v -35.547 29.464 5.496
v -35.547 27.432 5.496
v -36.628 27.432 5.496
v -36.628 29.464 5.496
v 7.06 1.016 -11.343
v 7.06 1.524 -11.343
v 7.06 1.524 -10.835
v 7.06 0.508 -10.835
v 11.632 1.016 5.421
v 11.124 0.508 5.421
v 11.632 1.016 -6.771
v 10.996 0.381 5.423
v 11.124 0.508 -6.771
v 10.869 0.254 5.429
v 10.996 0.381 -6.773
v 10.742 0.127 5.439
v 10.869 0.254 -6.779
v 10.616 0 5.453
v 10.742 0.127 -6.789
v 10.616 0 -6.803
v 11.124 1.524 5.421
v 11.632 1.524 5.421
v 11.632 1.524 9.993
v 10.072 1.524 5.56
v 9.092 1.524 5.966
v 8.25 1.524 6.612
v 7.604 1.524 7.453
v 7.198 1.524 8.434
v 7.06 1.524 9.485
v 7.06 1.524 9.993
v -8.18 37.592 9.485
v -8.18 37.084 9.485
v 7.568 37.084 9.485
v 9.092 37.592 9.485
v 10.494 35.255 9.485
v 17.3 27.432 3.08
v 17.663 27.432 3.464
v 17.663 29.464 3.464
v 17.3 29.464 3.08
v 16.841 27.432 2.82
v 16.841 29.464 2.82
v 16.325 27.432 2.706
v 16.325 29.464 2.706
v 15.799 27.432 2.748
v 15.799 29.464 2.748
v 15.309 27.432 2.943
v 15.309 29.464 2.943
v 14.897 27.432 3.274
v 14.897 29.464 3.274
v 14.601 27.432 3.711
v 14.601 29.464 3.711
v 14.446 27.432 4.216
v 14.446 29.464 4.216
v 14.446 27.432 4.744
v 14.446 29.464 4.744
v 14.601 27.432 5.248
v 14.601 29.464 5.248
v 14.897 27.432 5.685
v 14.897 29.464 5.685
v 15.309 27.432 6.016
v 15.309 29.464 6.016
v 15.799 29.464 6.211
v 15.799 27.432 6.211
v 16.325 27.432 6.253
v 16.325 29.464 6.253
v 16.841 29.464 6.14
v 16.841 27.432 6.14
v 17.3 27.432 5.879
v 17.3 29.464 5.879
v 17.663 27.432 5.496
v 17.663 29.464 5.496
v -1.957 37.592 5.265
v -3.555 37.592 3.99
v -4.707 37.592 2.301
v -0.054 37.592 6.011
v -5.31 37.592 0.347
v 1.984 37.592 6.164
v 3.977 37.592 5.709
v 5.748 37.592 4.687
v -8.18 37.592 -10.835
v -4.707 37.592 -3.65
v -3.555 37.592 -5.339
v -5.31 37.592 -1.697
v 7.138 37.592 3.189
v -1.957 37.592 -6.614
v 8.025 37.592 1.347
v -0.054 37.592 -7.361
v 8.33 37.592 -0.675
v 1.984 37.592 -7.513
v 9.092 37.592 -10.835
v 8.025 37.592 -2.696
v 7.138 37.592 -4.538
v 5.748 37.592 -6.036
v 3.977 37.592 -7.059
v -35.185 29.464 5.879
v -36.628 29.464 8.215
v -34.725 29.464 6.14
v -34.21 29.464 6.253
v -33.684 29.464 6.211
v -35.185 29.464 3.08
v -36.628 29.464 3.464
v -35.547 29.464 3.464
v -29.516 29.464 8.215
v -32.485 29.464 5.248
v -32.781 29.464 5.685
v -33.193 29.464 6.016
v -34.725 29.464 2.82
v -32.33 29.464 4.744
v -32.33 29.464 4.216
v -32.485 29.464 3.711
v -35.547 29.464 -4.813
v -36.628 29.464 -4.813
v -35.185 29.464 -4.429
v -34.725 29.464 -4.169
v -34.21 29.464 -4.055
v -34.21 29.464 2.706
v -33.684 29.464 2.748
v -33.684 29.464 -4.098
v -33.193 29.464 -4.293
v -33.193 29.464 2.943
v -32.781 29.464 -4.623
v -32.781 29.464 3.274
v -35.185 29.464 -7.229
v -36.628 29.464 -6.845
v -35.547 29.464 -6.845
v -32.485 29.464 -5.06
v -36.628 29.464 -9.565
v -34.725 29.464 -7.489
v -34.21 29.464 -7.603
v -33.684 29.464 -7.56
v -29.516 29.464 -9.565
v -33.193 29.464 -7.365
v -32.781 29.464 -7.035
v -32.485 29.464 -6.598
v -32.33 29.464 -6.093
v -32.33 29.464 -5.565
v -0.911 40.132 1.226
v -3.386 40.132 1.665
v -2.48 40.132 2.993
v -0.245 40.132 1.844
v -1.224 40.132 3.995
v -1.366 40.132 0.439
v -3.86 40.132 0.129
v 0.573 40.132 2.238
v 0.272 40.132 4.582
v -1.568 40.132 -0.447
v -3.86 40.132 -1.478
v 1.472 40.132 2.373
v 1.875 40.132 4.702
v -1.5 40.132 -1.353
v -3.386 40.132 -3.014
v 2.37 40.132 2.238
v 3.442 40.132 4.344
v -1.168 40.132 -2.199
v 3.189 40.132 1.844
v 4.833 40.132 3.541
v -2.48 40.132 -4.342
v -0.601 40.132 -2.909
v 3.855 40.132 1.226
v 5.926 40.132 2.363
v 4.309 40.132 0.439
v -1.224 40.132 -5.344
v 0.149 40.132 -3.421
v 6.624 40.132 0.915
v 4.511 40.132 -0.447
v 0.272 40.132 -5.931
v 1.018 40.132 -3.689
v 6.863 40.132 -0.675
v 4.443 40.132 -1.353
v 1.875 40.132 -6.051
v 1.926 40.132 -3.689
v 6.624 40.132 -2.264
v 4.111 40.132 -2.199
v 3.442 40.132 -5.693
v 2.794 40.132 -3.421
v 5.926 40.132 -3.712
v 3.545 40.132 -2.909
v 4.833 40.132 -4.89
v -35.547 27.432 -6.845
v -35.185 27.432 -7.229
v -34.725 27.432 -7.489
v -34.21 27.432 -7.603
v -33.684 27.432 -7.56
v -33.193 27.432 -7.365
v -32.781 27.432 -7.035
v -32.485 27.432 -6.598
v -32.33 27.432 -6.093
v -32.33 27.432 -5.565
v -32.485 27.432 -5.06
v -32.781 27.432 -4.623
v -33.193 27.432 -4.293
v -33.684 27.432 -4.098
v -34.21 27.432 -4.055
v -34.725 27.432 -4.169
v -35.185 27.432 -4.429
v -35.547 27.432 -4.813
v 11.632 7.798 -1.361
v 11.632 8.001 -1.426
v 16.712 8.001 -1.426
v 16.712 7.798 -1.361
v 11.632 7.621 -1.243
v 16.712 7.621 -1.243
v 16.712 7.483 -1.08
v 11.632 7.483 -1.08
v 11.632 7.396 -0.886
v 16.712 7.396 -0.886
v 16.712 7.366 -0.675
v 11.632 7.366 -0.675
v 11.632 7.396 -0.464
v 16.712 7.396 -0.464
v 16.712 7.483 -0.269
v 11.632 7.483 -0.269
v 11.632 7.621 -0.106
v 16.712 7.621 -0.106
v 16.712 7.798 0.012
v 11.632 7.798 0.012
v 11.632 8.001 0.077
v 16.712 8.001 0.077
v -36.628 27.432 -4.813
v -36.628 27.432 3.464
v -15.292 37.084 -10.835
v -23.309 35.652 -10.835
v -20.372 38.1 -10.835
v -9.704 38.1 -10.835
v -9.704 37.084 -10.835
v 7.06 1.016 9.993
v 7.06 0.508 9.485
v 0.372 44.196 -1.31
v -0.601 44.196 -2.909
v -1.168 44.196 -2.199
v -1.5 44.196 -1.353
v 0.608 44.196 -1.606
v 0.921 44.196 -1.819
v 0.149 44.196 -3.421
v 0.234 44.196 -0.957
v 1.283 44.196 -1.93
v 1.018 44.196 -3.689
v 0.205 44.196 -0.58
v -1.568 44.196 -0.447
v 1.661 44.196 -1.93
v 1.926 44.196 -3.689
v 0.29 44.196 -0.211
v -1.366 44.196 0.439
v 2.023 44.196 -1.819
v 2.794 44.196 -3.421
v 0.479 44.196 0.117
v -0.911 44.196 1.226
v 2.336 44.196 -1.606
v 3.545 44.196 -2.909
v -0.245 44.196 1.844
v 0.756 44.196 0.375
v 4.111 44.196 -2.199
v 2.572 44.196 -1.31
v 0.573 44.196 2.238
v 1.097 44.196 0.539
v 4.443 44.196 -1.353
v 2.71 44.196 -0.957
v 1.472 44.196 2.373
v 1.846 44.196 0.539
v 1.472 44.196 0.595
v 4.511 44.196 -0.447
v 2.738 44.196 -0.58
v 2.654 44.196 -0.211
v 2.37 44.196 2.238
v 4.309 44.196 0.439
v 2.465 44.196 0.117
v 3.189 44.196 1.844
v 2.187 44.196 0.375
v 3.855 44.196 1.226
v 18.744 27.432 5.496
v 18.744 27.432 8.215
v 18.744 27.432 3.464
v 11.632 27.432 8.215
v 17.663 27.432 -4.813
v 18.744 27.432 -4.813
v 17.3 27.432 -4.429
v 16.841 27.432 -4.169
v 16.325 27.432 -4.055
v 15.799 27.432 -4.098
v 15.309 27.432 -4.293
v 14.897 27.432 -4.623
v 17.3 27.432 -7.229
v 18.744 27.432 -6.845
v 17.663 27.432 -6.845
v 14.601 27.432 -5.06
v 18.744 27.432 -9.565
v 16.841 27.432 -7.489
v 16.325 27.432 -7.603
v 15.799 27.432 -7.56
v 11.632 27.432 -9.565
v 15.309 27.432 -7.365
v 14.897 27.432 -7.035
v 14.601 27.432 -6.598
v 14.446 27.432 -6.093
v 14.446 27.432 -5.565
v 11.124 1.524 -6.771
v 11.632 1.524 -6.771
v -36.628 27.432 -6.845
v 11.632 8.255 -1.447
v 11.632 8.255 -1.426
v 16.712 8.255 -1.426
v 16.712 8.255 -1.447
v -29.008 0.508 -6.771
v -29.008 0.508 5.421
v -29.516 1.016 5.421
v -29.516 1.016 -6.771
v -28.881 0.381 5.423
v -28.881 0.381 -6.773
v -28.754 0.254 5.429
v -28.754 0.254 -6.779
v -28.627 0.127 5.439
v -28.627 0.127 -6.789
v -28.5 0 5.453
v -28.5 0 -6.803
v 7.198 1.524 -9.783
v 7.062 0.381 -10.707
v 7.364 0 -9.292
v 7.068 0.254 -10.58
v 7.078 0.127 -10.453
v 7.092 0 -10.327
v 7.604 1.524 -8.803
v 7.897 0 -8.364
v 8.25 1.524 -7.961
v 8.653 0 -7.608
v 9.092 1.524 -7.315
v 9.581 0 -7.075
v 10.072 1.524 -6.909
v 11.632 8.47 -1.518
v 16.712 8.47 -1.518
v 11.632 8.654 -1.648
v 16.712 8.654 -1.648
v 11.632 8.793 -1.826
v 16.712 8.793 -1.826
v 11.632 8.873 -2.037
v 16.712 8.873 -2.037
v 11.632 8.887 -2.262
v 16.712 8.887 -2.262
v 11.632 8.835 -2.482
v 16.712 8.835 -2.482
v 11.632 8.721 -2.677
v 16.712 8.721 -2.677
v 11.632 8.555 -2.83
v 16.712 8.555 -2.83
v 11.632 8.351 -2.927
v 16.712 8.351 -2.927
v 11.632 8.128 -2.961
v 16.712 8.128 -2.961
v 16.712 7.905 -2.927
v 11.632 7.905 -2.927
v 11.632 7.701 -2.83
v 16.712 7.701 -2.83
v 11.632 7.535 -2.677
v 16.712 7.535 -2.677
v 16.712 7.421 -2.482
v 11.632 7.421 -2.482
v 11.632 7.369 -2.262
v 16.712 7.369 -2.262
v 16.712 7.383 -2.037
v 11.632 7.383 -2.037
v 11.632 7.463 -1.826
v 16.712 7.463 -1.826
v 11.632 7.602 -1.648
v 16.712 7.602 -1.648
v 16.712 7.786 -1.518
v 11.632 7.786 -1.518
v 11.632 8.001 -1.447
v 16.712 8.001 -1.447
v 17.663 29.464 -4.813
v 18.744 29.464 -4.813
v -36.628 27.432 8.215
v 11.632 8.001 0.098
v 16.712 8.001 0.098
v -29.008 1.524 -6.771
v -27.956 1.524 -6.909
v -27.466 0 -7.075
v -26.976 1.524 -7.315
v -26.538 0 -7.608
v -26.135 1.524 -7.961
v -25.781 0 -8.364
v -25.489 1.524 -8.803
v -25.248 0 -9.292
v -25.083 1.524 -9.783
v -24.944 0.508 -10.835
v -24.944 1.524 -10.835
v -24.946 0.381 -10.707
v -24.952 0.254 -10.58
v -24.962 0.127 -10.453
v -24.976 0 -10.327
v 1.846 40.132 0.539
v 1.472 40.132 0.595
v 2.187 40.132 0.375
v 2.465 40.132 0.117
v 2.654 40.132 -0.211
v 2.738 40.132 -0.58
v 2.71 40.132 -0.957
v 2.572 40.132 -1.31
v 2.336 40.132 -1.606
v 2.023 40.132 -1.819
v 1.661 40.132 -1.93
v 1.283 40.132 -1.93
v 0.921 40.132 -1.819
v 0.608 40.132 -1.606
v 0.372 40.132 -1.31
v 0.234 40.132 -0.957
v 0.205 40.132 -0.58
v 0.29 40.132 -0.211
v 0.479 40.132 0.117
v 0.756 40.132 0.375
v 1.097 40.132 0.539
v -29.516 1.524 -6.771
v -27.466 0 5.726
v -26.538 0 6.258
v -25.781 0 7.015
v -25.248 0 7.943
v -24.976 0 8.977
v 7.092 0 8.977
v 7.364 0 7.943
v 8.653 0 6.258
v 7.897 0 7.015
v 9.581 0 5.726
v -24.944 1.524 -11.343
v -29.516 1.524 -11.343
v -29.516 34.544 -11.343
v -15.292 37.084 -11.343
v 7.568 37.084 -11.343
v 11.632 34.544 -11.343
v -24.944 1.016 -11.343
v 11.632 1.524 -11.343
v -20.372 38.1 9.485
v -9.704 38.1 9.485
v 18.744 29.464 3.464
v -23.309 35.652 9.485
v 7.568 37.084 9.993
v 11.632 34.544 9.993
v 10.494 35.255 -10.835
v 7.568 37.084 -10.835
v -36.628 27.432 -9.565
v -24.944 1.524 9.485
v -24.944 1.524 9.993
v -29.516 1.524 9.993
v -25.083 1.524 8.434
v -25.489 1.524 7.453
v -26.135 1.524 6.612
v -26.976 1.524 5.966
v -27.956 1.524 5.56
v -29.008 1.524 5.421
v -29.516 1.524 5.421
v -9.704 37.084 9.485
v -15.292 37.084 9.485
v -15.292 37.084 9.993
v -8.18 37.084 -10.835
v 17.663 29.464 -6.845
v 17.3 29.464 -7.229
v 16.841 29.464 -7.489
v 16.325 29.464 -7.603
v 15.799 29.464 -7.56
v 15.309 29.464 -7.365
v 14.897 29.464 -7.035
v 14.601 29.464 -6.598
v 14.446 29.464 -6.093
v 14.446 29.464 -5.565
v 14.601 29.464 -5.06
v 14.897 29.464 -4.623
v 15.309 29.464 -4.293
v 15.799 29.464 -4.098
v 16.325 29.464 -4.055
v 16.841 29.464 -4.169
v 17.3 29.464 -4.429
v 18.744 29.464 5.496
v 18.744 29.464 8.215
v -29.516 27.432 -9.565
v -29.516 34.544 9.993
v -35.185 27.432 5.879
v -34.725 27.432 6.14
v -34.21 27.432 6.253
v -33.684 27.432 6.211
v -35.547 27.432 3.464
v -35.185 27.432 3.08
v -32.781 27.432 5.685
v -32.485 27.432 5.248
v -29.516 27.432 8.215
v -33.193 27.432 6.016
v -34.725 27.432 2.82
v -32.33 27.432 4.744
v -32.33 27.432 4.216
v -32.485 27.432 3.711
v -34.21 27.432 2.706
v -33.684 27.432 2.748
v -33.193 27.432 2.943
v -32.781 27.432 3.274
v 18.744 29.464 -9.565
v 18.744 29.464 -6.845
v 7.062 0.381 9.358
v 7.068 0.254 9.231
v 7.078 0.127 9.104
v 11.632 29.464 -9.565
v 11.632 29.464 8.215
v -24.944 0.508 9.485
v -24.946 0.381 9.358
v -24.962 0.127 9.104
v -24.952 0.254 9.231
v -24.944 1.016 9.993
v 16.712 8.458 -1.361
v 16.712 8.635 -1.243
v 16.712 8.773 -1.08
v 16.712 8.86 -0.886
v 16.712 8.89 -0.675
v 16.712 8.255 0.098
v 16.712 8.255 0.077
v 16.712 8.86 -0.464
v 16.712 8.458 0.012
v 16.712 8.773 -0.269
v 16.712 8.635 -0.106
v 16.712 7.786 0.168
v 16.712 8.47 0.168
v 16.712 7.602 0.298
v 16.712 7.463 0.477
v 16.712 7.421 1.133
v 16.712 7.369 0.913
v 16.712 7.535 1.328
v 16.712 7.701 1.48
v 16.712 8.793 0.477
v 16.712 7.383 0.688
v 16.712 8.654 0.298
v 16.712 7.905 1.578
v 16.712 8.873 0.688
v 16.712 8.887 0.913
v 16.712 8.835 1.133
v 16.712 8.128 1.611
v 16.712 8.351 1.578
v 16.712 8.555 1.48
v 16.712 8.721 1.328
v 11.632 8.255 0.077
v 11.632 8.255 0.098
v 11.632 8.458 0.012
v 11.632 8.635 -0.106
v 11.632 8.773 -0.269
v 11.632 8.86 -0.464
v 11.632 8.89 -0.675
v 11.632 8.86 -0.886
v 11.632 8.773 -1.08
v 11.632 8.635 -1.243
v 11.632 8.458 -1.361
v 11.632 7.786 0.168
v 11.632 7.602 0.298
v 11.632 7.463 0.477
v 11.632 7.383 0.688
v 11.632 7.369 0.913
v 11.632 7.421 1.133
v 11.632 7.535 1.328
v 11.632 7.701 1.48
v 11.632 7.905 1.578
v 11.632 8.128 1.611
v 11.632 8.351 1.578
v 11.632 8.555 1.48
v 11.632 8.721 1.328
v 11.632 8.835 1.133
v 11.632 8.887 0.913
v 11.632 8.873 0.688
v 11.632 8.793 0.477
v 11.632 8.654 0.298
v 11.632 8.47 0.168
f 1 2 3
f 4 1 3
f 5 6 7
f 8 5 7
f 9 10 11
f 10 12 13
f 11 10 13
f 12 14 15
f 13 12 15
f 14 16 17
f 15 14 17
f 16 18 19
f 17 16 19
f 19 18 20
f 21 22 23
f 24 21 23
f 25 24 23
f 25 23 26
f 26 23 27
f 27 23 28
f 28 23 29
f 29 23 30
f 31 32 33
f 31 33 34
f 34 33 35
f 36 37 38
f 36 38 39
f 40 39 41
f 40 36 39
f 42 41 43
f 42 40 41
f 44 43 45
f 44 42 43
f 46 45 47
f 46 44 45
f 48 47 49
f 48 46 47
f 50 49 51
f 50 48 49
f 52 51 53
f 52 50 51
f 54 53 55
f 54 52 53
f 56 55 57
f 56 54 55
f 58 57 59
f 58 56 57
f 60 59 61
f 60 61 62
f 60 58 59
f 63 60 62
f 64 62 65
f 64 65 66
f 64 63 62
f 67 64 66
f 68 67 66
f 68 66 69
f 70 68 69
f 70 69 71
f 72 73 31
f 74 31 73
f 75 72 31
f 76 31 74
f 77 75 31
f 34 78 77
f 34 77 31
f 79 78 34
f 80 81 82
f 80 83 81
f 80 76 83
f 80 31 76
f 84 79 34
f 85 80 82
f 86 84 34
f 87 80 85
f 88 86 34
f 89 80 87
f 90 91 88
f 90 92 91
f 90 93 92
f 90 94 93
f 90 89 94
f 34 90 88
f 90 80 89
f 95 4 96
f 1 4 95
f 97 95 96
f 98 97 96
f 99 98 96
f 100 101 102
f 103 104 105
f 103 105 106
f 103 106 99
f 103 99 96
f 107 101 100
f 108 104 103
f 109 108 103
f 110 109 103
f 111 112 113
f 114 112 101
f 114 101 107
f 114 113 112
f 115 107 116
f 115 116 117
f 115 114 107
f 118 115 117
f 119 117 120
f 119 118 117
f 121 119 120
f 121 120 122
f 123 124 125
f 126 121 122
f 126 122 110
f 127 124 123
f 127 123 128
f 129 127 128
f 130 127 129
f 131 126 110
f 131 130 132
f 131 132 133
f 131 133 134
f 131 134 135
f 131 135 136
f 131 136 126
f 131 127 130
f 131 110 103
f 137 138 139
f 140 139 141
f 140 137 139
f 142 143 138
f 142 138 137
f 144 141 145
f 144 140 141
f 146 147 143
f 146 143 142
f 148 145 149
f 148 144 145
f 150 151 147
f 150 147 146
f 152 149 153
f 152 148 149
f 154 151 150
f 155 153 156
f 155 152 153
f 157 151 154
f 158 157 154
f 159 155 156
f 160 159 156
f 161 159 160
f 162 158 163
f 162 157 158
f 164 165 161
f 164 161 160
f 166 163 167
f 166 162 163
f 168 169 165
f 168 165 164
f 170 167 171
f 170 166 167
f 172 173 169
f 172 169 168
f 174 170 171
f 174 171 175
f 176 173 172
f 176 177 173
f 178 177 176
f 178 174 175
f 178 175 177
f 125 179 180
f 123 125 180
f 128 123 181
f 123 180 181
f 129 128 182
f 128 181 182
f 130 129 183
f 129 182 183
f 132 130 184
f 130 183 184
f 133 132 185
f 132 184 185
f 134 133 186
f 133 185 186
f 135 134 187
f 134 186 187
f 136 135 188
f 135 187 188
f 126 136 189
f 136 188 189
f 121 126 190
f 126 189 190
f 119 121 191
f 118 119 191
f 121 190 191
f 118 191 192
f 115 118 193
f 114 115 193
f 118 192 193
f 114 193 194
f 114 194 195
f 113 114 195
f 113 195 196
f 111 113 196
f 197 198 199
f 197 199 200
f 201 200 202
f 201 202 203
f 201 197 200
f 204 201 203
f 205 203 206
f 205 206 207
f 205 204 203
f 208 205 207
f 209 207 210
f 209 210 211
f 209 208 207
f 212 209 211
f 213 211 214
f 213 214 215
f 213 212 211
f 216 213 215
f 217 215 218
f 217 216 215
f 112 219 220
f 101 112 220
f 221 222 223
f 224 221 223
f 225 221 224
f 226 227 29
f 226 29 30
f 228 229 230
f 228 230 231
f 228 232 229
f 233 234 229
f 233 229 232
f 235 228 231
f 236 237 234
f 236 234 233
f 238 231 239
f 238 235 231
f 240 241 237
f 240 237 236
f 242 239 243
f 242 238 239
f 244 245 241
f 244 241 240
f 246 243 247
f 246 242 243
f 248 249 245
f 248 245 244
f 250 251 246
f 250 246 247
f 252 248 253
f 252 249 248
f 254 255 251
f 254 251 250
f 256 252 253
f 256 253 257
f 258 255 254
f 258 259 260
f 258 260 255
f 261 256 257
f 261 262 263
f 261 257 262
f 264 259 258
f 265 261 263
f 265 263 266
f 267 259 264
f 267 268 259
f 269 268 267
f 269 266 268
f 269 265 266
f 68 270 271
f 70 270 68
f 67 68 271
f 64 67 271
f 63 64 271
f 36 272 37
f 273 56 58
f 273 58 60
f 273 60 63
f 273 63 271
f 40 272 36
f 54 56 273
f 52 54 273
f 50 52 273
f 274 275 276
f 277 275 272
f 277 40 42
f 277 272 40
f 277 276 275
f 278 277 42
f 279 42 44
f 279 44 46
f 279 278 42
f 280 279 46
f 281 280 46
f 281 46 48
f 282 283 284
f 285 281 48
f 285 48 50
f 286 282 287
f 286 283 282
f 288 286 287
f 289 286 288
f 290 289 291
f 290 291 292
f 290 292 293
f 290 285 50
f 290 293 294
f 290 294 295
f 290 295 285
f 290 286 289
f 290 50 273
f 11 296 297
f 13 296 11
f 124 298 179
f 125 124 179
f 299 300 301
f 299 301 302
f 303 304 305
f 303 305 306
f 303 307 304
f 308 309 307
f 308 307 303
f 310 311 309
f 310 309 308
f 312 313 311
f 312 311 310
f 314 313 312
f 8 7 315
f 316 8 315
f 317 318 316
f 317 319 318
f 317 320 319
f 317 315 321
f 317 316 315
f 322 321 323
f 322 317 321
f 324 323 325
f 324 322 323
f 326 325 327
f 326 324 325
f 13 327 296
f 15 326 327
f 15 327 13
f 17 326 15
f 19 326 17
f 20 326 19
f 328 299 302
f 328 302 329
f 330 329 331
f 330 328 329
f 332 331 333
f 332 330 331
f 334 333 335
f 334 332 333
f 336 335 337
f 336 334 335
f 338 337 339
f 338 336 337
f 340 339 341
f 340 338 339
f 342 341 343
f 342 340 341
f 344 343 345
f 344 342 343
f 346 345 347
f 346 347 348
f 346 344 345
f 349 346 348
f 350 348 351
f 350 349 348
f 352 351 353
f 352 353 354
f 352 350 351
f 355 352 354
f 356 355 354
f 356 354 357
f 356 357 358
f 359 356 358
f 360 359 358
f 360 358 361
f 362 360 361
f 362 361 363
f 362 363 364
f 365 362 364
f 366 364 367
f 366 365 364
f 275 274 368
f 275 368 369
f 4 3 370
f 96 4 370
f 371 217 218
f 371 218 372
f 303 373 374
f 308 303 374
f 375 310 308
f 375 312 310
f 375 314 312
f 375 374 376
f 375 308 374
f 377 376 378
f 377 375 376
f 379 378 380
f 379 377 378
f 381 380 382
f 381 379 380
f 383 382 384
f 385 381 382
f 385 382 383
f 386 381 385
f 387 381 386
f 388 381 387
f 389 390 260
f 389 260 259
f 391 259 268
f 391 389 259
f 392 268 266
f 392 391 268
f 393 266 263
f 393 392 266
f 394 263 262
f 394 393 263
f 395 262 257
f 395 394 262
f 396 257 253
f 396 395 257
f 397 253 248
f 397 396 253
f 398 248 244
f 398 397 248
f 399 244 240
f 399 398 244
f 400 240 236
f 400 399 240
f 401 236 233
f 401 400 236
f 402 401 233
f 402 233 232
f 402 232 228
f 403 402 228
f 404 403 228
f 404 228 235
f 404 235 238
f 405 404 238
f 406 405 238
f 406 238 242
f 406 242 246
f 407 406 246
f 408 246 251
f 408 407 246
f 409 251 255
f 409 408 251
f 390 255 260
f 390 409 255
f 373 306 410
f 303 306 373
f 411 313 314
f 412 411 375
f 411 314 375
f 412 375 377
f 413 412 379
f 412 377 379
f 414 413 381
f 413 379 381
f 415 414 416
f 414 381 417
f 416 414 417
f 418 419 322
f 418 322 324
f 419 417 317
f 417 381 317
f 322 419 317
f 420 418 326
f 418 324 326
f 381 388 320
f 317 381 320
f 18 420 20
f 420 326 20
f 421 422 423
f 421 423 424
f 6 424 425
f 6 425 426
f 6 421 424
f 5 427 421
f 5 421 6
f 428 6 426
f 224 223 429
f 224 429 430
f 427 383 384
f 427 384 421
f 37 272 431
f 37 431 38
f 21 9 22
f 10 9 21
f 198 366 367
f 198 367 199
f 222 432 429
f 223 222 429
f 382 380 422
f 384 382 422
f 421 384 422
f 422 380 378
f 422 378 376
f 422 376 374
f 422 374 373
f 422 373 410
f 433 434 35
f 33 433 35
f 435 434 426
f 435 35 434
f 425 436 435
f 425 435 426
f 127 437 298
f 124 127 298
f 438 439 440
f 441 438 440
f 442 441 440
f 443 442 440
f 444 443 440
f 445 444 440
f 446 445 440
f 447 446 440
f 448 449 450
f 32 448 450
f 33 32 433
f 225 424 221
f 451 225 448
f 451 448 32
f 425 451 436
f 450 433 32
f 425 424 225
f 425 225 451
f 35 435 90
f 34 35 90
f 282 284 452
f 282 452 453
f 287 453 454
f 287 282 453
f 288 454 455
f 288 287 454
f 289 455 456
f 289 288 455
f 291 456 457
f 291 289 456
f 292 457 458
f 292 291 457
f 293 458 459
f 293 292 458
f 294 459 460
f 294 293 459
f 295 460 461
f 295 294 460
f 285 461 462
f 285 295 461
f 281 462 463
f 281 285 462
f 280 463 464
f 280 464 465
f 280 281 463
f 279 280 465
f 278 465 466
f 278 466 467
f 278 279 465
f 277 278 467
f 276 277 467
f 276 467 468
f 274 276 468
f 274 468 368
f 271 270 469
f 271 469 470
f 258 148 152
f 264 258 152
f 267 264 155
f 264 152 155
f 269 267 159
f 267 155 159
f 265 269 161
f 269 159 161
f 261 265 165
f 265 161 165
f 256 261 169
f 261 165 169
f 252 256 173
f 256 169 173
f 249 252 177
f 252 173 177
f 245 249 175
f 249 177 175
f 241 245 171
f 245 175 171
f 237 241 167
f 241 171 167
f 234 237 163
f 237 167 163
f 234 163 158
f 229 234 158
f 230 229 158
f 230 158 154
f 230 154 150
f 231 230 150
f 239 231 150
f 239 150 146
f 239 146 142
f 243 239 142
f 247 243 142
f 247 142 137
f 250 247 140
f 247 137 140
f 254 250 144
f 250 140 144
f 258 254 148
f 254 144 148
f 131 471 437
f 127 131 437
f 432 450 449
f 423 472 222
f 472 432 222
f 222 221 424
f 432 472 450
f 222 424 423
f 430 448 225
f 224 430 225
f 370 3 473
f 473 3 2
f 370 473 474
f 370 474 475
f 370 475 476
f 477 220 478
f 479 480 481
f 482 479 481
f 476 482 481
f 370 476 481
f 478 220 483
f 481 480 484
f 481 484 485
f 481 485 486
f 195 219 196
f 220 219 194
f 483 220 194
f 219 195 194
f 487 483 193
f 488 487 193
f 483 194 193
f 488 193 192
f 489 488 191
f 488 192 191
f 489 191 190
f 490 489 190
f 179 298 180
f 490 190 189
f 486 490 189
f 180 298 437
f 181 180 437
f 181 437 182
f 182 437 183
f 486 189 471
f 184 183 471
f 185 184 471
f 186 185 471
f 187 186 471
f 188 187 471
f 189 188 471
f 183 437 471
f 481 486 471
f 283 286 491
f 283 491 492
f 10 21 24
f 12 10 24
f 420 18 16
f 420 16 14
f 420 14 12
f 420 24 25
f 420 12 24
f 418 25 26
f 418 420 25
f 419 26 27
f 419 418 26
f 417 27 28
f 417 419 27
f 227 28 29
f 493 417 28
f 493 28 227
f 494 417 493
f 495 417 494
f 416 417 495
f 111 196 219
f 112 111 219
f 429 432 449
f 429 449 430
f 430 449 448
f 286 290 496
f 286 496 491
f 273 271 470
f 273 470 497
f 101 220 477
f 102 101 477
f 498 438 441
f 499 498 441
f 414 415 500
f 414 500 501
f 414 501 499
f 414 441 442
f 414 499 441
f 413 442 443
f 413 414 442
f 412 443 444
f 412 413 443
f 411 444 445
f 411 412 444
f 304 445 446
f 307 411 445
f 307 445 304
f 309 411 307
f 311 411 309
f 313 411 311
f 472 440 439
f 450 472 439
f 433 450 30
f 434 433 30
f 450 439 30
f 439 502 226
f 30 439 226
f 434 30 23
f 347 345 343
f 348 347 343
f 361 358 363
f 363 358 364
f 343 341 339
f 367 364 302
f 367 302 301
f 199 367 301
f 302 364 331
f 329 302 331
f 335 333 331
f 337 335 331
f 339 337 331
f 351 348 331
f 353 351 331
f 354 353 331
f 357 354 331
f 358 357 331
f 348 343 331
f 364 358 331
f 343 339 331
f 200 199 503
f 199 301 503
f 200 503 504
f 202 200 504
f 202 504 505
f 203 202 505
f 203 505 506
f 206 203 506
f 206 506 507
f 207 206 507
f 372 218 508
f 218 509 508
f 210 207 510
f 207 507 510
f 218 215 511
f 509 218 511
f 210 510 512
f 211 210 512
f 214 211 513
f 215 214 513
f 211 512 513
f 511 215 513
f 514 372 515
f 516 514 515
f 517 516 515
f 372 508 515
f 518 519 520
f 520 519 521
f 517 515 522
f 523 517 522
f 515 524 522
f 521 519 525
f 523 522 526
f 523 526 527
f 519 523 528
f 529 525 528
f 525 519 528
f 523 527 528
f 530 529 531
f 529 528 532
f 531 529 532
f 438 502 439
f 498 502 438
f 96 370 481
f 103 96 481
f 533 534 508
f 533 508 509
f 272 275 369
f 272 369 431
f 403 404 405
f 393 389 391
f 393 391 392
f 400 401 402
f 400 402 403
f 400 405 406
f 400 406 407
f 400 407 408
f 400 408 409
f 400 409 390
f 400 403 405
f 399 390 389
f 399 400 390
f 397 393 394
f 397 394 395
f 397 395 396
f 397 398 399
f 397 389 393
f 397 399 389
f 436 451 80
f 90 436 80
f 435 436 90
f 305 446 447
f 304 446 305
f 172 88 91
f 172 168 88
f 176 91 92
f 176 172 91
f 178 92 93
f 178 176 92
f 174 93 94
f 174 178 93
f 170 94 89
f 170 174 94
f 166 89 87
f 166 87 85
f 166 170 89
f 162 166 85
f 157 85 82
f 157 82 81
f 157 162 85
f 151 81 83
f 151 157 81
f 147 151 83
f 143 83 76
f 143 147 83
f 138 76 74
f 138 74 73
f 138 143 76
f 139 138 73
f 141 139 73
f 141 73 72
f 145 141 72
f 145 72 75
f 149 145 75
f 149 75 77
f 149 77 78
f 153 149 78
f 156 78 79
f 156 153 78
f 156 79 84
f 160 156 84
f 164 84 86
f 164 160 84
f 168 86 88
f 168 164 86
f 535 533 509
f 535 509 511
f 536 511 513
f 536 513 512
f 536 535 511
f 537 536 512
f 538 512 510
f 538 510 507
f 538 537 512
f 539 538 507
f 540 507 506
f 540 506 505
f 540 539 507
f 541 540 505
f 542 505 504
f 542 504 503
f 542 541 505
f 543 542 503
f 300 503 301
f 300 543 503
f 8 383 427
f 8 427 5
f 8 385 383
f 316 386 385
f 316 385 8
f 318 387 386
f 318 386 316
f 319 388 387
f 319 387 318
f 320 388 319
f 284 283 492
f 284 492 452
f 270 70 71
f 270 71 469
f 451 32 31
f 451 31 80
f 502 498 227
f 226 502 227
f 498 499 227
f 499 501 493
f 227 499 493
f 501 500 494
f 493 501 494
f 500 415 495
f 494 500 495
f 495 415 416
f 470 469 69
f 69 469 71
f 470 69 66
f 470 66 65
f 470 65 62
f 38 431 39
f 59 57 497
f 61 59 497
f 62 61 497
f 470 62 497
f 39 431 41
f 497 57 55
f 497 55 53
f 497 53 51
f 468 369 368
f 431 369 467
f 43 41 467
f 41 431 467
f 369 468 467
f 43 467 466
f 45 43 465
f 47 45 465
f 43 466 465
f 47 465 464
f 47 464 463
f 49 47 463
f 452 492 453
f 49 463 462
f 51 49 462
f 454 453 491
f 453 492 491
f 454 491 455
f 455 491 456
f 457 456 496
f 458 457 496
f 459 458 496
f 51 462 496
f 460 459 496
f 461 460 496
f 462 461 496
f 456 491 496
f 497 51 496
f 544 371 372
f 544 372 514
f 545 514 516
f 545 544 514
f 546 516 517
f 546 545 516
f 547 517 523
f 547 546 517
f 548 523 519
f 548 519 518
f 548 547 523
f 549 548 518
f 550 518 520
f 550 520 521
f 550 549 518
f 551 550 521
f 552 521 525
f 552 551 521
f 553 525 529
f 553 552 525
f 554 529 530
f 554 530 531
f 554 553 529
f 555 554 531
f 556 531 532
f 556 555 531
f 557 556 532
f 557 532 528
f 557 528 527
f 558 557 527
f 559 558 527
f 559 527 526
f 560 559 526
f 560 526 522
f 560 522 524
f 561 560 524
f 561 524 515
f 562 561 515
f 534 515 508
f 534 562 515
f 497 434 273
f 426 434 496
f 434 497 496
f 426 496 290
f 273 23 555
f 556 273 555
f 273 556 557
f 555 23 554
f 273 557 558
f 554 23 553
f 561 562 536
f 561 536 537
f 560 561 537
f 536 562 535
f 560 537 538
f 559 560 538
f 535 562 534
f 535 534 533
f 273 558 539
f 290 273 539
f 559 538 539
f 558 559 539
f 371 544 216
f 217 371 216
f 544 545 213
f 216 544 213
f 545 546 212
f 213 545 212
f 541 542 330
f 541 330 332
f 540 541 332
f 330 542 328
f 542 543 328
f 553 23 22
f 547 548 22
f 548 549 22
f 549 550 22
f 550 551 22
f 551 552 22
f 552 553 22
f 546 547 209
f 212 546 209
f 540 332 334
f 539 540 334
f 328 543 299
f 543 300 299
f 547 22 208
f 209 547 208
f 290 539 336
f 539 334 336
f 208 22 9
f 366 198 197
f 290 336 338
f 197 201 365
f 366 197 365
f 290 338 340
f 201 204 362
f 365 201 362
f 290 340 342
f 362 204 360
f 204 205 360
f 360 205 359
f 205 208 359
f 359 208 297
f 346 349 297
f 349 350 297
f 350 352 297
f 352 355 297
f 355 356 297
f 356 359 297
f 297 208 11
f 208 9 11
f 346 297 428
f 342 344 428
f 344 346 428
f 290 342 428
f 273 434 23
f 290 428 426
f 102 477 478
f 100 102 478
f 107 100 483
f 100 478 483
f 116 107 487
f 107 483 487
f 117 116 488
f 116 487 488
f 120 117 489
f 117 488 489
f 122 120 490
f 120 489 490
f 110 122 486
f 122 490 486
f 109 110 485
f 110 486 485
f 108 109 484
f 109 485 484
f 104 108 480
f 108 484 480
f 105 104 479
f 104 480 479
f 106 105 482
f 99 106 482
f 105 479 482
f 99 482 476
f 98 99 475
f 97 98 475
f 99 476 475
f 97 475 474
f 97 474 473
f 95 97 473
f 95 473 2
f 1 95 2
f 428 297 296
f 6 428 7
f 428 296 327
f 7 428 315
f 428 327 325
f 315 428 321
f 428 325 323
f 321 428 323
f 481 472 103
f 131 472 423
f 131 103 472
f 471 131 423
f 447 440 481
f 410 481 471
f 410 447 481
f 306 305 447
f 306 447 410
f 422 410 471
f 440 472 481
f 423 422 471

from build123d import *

# Parameters (mm, degrees)
SKETCH1_W           = 41.148
SKETCH1_H           = 21.336
BOSS_EXTRUDE1_DEPTH = 37.084
CHAMFER1_SIZE       = 2.54
CHAMFER1_SIZE2      = 14.224
CHAMFER2_SIZE       = 2.54
CHAMFER2_SIZE2      = 4.064
SKETCH3_W           = 18.796
SKETCH3_H           = 20.32
BOSS_EXTRUDE2_DEPTH = 2.54
CHAMFER3_SIZE       = 2.54
CHAMFER3_SIZE_2     = 1.524
SKETCH4_W           = 13.716
SKETCH4_H           = 20.32
BOSS_EXTRUDE3_DEPTH = 3.556
CHAMFER4_SIZE       = 2.54
CHAMFER4_SIZE_2     = 3.048
SKETCH5_R           = 6.858
BOSS_EXTRUDE4_DEPTH = 2.54
BOSS_EXTRUDE4_TAPER = 30
SKETCH6_R           = 3.048
SKETCH6_R_2         = 1.27
BOSS_EXTRUDE5_DEPTH = 4.064
BOSS_EXTRUDE6_DEPTH = 2.032
CHAMFER5_SIZE       = 1.016
CUT_EXTRUDE1_DEPTH  = 1.524
BOSS_EXTRUDE7_DEPTH = 5.08


with BuildPart() as part:
    # Sketch1 → Boss-Extrude1 (new body)
    with BuildSketch(Plane(origin=(0, 0, 0), x_dir=(1, 0, 0), z_dir=(0, 1, 0))):
        with Locations((-8.942205534, 0.674656126)):
            Rectangle(SKETCH1_W, SKETCH1_H)
    extrude(amount=BOSS_EXTRUDE1_DEPTH)

    # Chamfer1
    chamfer1_edges = [part.edges().sort_by_distance(p)[0] for p in [
        (-29.516205534, 37.084, -0.674656126),
    ]]
    chamfer1_side = [part.faces().sort_by_distance(p)[0] for p in [
        (-29.516205534, 18.542, -0.674656126),
    ]]
    chamfer(chamfer1_edges, length=CHAMFER1_SIZE, length2=CHAMFER1_SIZE2, reference=chamfer1_side[0])

    # Chamfer2
    chamfer2_edges = [part.edges().sort_by_distance(p)[0] for p in [
        (11.631794466, 37.084, -0.674656126),
    ]]
    chamfer2_side = [part.faces().sort_by_distance(p)[0] for p in [
        (11.631794466, 18.542, -0.674656126),
    ]]
    chamfer(chamfer2_edges, length=CHAMFER2_SIZE, length2=CHAMFER2_SIZE2, reference=chamfer2_side[0])

    # Sketch3 → Boss-Extrude2 (add)
    with BuildSketch(Plane(origin=(0, 35.052, 0), x_dir=(1, 0, 0), z_dir=(0, 1, 0))):
        with Locations((1.217794466, 0.674656126)):
            Rectangle(SKETCH3_W, SKETCH3_H)
    extrude(amount=BOSS_EXTRUDE2_DEPTH)

    # Chamfer3
    # the kernel refuses this chamfer: 2.54, 1.524 mm, written as the material it takes off along each edge
    with BuildSketch(Plane(origin=(10.615794466, 37.592, -17.403759313), x_dir=(0.019893418958582338, -0.9998021063601228, 0), z_dir=(0, 0, 1))) as chamfer3_piece_1_section:
        Polygon((CHAMFER3_SIZE * 0.99980210636, -CHAMFER3_SIZE * 0.0198934189586), (-CHAMFER3_SIZE_2 * 0.0198934189586, -CHAMFER3_SIZE_2 * 0.99980210636), (0, 0), align=None)
    chamfer3_piece_1 = extrude(amount=33.458206374, mode=Mode.PRIVATE)
    chamfer3_piece_1 = split(chamfer3_piece_1, bisect_by=Plane(origin=(9.549275809, 35.845574161, -0.674656126), z_dir=(0.5299989400031799, 0.8479983040050881, 0)), keep=Keep.TOP, mode=Mode.PRIVATE)
    add(chamfer3_piece_1, mode=Mode.SUBTRACT)

    # Sketch4 → Boss-Extrude3 (add)
    with BuildSketch(Plane(origin=(0, 34.544, 0), x_dir=(1, 0, 0), z_dir=(0, 1, 0))):
        with Locations((-16.562205534, 0.674656126)):
            Rectangle(SKETCH4_W, SKETCH4_H)
    extrude(amount=BOSS_EXTRUDE3_DEPTH)

    # Chamfer4
    # the kernel refuses this chamfer: 3.048, 2.54 mm, written as the material it takes off along each edge
    with BuildSketch(Plane(origin=(-23.420205534, 38.1, 17.341921223), x_dir=(-0.03575241599375306, -0.9993606780090006, 0), z_dir=(0, 0, -1))) as chamfer4_piece_1_section:
        Polygon((CHAMFER4_SIZE * 0.999360678009, -CHAMFER4_SIZE * 0.0357524159938), (-CHAMFER4_SIZE_2 * 0.0357524159938, -CHAMFER4_SIZE_2 * 0.999360678009), (0, 0), align=None)
    chamfer4_piece_1 = extrude(amount=36.0331547, mode=Mode.PRIVATE)
    chamfer4_piece_1 = split(chamfer4_piece_1, bisect_by=Plane(origin=(-22.151753268, 35.859080762, -0.674656126), z_dir=(-0.17579063848365747, 0.984427575508482, 0)), keep=Keep.TOP, mode=Mode.PRIVATE)
    add(chamfer4_piece_1, mode=Mode.SUBTRACT)

    # Sketch5 → Boss-Extrude4 (add)
    with BuildSketch(Plane(origin=(0, 37.592, 0), x_dir=(1, 0, 0), z_dir=(0, 1, 0))):
        with Locations((1.471794466, 0.674656126)):
            Circle(SKETCH5_R)
    extrude(amount=BOSS_EXTRUDE4_DEPTH, taper=BOSS_EXTRUDE4_TAPER)

    # Sketch6 → Boss-Extrude5 (add)
    with BuildSketch(Plane(origin=(0, 40.132, 0), x_dir=(1, 0, 0), z_dir=(0, 1, 0))):
        with Locations(Location((1.471794466, 0.674656126, 0), (0, 0, 270))):
            Circle(SKETCH6_R)
        with Locations(Location((1.471794466, 0.674656126, 0), (0, 0, 270))):
            Circle(SKETCH6_R_2, mode=Mode.SUBTRACT)
    extrude(amount=BOSS_EXTRUDE5_DEPTH)

    # Sketch7 → Boss-Extrude6 (add)
    with BuildSketch(Plane(origin=(0, 27.432, 0), x_dir=(-1, 0, 0), z_dir=(0, -1, 0))):
        with BuildLine():
            Line((29.516205534, 9.564656126), (36.628205534, 9.564656126))
            Line((36.628205534, 9.564656126), (36.628205534, 6.84497112))
            Line((36.628205534, 6.84497112), (35.547324446, 6.84497112))
            ThreePointArc((35.547324446, 6.84497112), (32.310205534, 5.82897112), (35.547324446, 4.81297112))
            Line((35.547324446, 4.81297112), (36.628205534, 4.81297112))
            Line((36.628205534, 4.81297112), (36.628205534, -3.463658867))
            Line((36.628205534, -3.463658867), (35.547324446, -3.463658867))
            ThreePointArc((35.547324446, -3.463658867), (32.310205534, -4.479658867), (35.547324446, -5.495658867))
            Line((35.547324446, -5.495658867), (36.628205534, -5.495658867))
            Line((36.628205534, -5.495658867), (36.628205534, -8.215343874))
            Line((36.628205534, -8.215343874), (29.516205534, -8.215343874))
            Line((29.516205534, -8.215343874), (29.516205534, 9.564656126))
        make_face()
    boss_extrude6 = extrude(amount=-BOSS_EXTRUDE6_DEPTH)

    # Mirror1: Boss-Extrude6 across plane
    add(boss_extrude6.mirror(Plane(origin=(-8.942205534, 0, 0), x_dir=(0, 0, 1), z_dir=(1, 0, 0))))

    # Chamfer5
    chamfer5_edges = [part.edges().sort_by_distance(p)[0] for p in [
        (-8.942205534, 0, -11.342656126),
        (11.631794466, 0, -0.674656126),
        (-8.942205534, 0, 9.993343874),
        (-29.516205534, 0, -0.674656126),
    ]]
    chamfer(chamfer5_edges, length=CHAMFER5_SIZE)

    # Sketch8 → Cut-Extrude1 (cut)
    with BuildSketch(Plane.XZ):
        with BuildLine():
            Line((-29.516205534, 9.993343874), (-24.944205534, 9.993343874))
            Line((-24.944205534, 9.993343874), (-24.944205534, 9.485343874))
            ThreePointArc((-24.944205534, 9.485343874), (-26.134523575, 6.611661915), (-29.008205534, 5.421343874))
            Line((-29.008205534, 5.421343874), (-29.516205534, 5.421343874))
            Line((-29.516205534, 5.421343874), (-29.516205534, 9.993343874))
        make_face()
        with BuildLine():
            Line((-29.516205534, -11.342656126), (-29.516205534, -6.770656126))
            Line((-29.516205534, -6.770656126), (-29.008205534, -6.770656126))
            ThreePointArc((-29.008205534, -6.770656126), (-26.134523575, -7.960974168), (-24.944205534, -10.834656126))
            Line((-24.944205534, -10.834656126), (-24.944205534, -11.342656126))
            Line((-24.944205534, -11.342656126), (-29.516205534, -11.342656126))
        make_face()
        with BuildLine():
            Line((11.631794466, -11.342656126), (7.059794466, -11.342656126))
            Line((7.059794466, -11.342656126), (7.059794466, -10.834656126))
            ThreePointArc((7.059794466, -10.834656126), (8.250112508, -7.960974168), (11.123794466, -6.770656126))
            Line((11.123794466, -6.770656126), (11.631794466, -6.770656126))
            Line((11.631794466, -6.770656126), (11.631794466, -11.342656126))
        make_face()
        with BuildLine():
            Line((11.631794466, 9.993343874), (11.631794466, 5.421343874))
            Line((11.631794466, 5.421343874), (11.123794466, 5.421343874))
            ThreePointArc((11.123794466, 5.421343874), (8.250112508, 6.611661915), (7.059794466, 9.485343874))
            Line((7.059794466, 9.485343874), (7.059794466, 9.993343874))
            Line((7.059794466, 9.993343874), (11.631794466, 9.993343874))
        make_face()
    extrude(amount=-CUT_EXTRUDE1_DEPTH, mode=Mode.SUBTRACT)

    # Sketch9 → Boss-Extrude7 (add)
    with BuildSketch(Plane(origin=(11.631794466, 0, 0), x_dir=(0, 0, -1), z_dir=(1, 0, 0))):
        with BuildLine():
            Line((-0.098001741, 8.255), (-0.076686006, 8.255))
            ThreePointArc((-0.076686006, 8.255), (0.674656126, 8.89), (1.425998259, 8.255))
            Line((1.425998259, 8.255), (1.447313994, 8.255))
            ThreePointArc((1.447313994, 8.255), (2.960656126, 8.128), (1.447313994, 8.001))
            Line((1.447313994, 8.001), (1.425998259, 8.001))
            ThreePointArc((1.425998259, 8.001), (0.674656126, 7.366), (-0.076686006, 8.001))
            Line((-0.076686006, 8.001), (-0.098001741, 8.001))
            ThreePointArc((-0.098001741, 8.001), (-1.611343874, 8.128), (-0.098001741, 8.255))
        make_face()
    extrude(amount=BOSS_EXTRUDE7_DEPTH)


solid = part.part
